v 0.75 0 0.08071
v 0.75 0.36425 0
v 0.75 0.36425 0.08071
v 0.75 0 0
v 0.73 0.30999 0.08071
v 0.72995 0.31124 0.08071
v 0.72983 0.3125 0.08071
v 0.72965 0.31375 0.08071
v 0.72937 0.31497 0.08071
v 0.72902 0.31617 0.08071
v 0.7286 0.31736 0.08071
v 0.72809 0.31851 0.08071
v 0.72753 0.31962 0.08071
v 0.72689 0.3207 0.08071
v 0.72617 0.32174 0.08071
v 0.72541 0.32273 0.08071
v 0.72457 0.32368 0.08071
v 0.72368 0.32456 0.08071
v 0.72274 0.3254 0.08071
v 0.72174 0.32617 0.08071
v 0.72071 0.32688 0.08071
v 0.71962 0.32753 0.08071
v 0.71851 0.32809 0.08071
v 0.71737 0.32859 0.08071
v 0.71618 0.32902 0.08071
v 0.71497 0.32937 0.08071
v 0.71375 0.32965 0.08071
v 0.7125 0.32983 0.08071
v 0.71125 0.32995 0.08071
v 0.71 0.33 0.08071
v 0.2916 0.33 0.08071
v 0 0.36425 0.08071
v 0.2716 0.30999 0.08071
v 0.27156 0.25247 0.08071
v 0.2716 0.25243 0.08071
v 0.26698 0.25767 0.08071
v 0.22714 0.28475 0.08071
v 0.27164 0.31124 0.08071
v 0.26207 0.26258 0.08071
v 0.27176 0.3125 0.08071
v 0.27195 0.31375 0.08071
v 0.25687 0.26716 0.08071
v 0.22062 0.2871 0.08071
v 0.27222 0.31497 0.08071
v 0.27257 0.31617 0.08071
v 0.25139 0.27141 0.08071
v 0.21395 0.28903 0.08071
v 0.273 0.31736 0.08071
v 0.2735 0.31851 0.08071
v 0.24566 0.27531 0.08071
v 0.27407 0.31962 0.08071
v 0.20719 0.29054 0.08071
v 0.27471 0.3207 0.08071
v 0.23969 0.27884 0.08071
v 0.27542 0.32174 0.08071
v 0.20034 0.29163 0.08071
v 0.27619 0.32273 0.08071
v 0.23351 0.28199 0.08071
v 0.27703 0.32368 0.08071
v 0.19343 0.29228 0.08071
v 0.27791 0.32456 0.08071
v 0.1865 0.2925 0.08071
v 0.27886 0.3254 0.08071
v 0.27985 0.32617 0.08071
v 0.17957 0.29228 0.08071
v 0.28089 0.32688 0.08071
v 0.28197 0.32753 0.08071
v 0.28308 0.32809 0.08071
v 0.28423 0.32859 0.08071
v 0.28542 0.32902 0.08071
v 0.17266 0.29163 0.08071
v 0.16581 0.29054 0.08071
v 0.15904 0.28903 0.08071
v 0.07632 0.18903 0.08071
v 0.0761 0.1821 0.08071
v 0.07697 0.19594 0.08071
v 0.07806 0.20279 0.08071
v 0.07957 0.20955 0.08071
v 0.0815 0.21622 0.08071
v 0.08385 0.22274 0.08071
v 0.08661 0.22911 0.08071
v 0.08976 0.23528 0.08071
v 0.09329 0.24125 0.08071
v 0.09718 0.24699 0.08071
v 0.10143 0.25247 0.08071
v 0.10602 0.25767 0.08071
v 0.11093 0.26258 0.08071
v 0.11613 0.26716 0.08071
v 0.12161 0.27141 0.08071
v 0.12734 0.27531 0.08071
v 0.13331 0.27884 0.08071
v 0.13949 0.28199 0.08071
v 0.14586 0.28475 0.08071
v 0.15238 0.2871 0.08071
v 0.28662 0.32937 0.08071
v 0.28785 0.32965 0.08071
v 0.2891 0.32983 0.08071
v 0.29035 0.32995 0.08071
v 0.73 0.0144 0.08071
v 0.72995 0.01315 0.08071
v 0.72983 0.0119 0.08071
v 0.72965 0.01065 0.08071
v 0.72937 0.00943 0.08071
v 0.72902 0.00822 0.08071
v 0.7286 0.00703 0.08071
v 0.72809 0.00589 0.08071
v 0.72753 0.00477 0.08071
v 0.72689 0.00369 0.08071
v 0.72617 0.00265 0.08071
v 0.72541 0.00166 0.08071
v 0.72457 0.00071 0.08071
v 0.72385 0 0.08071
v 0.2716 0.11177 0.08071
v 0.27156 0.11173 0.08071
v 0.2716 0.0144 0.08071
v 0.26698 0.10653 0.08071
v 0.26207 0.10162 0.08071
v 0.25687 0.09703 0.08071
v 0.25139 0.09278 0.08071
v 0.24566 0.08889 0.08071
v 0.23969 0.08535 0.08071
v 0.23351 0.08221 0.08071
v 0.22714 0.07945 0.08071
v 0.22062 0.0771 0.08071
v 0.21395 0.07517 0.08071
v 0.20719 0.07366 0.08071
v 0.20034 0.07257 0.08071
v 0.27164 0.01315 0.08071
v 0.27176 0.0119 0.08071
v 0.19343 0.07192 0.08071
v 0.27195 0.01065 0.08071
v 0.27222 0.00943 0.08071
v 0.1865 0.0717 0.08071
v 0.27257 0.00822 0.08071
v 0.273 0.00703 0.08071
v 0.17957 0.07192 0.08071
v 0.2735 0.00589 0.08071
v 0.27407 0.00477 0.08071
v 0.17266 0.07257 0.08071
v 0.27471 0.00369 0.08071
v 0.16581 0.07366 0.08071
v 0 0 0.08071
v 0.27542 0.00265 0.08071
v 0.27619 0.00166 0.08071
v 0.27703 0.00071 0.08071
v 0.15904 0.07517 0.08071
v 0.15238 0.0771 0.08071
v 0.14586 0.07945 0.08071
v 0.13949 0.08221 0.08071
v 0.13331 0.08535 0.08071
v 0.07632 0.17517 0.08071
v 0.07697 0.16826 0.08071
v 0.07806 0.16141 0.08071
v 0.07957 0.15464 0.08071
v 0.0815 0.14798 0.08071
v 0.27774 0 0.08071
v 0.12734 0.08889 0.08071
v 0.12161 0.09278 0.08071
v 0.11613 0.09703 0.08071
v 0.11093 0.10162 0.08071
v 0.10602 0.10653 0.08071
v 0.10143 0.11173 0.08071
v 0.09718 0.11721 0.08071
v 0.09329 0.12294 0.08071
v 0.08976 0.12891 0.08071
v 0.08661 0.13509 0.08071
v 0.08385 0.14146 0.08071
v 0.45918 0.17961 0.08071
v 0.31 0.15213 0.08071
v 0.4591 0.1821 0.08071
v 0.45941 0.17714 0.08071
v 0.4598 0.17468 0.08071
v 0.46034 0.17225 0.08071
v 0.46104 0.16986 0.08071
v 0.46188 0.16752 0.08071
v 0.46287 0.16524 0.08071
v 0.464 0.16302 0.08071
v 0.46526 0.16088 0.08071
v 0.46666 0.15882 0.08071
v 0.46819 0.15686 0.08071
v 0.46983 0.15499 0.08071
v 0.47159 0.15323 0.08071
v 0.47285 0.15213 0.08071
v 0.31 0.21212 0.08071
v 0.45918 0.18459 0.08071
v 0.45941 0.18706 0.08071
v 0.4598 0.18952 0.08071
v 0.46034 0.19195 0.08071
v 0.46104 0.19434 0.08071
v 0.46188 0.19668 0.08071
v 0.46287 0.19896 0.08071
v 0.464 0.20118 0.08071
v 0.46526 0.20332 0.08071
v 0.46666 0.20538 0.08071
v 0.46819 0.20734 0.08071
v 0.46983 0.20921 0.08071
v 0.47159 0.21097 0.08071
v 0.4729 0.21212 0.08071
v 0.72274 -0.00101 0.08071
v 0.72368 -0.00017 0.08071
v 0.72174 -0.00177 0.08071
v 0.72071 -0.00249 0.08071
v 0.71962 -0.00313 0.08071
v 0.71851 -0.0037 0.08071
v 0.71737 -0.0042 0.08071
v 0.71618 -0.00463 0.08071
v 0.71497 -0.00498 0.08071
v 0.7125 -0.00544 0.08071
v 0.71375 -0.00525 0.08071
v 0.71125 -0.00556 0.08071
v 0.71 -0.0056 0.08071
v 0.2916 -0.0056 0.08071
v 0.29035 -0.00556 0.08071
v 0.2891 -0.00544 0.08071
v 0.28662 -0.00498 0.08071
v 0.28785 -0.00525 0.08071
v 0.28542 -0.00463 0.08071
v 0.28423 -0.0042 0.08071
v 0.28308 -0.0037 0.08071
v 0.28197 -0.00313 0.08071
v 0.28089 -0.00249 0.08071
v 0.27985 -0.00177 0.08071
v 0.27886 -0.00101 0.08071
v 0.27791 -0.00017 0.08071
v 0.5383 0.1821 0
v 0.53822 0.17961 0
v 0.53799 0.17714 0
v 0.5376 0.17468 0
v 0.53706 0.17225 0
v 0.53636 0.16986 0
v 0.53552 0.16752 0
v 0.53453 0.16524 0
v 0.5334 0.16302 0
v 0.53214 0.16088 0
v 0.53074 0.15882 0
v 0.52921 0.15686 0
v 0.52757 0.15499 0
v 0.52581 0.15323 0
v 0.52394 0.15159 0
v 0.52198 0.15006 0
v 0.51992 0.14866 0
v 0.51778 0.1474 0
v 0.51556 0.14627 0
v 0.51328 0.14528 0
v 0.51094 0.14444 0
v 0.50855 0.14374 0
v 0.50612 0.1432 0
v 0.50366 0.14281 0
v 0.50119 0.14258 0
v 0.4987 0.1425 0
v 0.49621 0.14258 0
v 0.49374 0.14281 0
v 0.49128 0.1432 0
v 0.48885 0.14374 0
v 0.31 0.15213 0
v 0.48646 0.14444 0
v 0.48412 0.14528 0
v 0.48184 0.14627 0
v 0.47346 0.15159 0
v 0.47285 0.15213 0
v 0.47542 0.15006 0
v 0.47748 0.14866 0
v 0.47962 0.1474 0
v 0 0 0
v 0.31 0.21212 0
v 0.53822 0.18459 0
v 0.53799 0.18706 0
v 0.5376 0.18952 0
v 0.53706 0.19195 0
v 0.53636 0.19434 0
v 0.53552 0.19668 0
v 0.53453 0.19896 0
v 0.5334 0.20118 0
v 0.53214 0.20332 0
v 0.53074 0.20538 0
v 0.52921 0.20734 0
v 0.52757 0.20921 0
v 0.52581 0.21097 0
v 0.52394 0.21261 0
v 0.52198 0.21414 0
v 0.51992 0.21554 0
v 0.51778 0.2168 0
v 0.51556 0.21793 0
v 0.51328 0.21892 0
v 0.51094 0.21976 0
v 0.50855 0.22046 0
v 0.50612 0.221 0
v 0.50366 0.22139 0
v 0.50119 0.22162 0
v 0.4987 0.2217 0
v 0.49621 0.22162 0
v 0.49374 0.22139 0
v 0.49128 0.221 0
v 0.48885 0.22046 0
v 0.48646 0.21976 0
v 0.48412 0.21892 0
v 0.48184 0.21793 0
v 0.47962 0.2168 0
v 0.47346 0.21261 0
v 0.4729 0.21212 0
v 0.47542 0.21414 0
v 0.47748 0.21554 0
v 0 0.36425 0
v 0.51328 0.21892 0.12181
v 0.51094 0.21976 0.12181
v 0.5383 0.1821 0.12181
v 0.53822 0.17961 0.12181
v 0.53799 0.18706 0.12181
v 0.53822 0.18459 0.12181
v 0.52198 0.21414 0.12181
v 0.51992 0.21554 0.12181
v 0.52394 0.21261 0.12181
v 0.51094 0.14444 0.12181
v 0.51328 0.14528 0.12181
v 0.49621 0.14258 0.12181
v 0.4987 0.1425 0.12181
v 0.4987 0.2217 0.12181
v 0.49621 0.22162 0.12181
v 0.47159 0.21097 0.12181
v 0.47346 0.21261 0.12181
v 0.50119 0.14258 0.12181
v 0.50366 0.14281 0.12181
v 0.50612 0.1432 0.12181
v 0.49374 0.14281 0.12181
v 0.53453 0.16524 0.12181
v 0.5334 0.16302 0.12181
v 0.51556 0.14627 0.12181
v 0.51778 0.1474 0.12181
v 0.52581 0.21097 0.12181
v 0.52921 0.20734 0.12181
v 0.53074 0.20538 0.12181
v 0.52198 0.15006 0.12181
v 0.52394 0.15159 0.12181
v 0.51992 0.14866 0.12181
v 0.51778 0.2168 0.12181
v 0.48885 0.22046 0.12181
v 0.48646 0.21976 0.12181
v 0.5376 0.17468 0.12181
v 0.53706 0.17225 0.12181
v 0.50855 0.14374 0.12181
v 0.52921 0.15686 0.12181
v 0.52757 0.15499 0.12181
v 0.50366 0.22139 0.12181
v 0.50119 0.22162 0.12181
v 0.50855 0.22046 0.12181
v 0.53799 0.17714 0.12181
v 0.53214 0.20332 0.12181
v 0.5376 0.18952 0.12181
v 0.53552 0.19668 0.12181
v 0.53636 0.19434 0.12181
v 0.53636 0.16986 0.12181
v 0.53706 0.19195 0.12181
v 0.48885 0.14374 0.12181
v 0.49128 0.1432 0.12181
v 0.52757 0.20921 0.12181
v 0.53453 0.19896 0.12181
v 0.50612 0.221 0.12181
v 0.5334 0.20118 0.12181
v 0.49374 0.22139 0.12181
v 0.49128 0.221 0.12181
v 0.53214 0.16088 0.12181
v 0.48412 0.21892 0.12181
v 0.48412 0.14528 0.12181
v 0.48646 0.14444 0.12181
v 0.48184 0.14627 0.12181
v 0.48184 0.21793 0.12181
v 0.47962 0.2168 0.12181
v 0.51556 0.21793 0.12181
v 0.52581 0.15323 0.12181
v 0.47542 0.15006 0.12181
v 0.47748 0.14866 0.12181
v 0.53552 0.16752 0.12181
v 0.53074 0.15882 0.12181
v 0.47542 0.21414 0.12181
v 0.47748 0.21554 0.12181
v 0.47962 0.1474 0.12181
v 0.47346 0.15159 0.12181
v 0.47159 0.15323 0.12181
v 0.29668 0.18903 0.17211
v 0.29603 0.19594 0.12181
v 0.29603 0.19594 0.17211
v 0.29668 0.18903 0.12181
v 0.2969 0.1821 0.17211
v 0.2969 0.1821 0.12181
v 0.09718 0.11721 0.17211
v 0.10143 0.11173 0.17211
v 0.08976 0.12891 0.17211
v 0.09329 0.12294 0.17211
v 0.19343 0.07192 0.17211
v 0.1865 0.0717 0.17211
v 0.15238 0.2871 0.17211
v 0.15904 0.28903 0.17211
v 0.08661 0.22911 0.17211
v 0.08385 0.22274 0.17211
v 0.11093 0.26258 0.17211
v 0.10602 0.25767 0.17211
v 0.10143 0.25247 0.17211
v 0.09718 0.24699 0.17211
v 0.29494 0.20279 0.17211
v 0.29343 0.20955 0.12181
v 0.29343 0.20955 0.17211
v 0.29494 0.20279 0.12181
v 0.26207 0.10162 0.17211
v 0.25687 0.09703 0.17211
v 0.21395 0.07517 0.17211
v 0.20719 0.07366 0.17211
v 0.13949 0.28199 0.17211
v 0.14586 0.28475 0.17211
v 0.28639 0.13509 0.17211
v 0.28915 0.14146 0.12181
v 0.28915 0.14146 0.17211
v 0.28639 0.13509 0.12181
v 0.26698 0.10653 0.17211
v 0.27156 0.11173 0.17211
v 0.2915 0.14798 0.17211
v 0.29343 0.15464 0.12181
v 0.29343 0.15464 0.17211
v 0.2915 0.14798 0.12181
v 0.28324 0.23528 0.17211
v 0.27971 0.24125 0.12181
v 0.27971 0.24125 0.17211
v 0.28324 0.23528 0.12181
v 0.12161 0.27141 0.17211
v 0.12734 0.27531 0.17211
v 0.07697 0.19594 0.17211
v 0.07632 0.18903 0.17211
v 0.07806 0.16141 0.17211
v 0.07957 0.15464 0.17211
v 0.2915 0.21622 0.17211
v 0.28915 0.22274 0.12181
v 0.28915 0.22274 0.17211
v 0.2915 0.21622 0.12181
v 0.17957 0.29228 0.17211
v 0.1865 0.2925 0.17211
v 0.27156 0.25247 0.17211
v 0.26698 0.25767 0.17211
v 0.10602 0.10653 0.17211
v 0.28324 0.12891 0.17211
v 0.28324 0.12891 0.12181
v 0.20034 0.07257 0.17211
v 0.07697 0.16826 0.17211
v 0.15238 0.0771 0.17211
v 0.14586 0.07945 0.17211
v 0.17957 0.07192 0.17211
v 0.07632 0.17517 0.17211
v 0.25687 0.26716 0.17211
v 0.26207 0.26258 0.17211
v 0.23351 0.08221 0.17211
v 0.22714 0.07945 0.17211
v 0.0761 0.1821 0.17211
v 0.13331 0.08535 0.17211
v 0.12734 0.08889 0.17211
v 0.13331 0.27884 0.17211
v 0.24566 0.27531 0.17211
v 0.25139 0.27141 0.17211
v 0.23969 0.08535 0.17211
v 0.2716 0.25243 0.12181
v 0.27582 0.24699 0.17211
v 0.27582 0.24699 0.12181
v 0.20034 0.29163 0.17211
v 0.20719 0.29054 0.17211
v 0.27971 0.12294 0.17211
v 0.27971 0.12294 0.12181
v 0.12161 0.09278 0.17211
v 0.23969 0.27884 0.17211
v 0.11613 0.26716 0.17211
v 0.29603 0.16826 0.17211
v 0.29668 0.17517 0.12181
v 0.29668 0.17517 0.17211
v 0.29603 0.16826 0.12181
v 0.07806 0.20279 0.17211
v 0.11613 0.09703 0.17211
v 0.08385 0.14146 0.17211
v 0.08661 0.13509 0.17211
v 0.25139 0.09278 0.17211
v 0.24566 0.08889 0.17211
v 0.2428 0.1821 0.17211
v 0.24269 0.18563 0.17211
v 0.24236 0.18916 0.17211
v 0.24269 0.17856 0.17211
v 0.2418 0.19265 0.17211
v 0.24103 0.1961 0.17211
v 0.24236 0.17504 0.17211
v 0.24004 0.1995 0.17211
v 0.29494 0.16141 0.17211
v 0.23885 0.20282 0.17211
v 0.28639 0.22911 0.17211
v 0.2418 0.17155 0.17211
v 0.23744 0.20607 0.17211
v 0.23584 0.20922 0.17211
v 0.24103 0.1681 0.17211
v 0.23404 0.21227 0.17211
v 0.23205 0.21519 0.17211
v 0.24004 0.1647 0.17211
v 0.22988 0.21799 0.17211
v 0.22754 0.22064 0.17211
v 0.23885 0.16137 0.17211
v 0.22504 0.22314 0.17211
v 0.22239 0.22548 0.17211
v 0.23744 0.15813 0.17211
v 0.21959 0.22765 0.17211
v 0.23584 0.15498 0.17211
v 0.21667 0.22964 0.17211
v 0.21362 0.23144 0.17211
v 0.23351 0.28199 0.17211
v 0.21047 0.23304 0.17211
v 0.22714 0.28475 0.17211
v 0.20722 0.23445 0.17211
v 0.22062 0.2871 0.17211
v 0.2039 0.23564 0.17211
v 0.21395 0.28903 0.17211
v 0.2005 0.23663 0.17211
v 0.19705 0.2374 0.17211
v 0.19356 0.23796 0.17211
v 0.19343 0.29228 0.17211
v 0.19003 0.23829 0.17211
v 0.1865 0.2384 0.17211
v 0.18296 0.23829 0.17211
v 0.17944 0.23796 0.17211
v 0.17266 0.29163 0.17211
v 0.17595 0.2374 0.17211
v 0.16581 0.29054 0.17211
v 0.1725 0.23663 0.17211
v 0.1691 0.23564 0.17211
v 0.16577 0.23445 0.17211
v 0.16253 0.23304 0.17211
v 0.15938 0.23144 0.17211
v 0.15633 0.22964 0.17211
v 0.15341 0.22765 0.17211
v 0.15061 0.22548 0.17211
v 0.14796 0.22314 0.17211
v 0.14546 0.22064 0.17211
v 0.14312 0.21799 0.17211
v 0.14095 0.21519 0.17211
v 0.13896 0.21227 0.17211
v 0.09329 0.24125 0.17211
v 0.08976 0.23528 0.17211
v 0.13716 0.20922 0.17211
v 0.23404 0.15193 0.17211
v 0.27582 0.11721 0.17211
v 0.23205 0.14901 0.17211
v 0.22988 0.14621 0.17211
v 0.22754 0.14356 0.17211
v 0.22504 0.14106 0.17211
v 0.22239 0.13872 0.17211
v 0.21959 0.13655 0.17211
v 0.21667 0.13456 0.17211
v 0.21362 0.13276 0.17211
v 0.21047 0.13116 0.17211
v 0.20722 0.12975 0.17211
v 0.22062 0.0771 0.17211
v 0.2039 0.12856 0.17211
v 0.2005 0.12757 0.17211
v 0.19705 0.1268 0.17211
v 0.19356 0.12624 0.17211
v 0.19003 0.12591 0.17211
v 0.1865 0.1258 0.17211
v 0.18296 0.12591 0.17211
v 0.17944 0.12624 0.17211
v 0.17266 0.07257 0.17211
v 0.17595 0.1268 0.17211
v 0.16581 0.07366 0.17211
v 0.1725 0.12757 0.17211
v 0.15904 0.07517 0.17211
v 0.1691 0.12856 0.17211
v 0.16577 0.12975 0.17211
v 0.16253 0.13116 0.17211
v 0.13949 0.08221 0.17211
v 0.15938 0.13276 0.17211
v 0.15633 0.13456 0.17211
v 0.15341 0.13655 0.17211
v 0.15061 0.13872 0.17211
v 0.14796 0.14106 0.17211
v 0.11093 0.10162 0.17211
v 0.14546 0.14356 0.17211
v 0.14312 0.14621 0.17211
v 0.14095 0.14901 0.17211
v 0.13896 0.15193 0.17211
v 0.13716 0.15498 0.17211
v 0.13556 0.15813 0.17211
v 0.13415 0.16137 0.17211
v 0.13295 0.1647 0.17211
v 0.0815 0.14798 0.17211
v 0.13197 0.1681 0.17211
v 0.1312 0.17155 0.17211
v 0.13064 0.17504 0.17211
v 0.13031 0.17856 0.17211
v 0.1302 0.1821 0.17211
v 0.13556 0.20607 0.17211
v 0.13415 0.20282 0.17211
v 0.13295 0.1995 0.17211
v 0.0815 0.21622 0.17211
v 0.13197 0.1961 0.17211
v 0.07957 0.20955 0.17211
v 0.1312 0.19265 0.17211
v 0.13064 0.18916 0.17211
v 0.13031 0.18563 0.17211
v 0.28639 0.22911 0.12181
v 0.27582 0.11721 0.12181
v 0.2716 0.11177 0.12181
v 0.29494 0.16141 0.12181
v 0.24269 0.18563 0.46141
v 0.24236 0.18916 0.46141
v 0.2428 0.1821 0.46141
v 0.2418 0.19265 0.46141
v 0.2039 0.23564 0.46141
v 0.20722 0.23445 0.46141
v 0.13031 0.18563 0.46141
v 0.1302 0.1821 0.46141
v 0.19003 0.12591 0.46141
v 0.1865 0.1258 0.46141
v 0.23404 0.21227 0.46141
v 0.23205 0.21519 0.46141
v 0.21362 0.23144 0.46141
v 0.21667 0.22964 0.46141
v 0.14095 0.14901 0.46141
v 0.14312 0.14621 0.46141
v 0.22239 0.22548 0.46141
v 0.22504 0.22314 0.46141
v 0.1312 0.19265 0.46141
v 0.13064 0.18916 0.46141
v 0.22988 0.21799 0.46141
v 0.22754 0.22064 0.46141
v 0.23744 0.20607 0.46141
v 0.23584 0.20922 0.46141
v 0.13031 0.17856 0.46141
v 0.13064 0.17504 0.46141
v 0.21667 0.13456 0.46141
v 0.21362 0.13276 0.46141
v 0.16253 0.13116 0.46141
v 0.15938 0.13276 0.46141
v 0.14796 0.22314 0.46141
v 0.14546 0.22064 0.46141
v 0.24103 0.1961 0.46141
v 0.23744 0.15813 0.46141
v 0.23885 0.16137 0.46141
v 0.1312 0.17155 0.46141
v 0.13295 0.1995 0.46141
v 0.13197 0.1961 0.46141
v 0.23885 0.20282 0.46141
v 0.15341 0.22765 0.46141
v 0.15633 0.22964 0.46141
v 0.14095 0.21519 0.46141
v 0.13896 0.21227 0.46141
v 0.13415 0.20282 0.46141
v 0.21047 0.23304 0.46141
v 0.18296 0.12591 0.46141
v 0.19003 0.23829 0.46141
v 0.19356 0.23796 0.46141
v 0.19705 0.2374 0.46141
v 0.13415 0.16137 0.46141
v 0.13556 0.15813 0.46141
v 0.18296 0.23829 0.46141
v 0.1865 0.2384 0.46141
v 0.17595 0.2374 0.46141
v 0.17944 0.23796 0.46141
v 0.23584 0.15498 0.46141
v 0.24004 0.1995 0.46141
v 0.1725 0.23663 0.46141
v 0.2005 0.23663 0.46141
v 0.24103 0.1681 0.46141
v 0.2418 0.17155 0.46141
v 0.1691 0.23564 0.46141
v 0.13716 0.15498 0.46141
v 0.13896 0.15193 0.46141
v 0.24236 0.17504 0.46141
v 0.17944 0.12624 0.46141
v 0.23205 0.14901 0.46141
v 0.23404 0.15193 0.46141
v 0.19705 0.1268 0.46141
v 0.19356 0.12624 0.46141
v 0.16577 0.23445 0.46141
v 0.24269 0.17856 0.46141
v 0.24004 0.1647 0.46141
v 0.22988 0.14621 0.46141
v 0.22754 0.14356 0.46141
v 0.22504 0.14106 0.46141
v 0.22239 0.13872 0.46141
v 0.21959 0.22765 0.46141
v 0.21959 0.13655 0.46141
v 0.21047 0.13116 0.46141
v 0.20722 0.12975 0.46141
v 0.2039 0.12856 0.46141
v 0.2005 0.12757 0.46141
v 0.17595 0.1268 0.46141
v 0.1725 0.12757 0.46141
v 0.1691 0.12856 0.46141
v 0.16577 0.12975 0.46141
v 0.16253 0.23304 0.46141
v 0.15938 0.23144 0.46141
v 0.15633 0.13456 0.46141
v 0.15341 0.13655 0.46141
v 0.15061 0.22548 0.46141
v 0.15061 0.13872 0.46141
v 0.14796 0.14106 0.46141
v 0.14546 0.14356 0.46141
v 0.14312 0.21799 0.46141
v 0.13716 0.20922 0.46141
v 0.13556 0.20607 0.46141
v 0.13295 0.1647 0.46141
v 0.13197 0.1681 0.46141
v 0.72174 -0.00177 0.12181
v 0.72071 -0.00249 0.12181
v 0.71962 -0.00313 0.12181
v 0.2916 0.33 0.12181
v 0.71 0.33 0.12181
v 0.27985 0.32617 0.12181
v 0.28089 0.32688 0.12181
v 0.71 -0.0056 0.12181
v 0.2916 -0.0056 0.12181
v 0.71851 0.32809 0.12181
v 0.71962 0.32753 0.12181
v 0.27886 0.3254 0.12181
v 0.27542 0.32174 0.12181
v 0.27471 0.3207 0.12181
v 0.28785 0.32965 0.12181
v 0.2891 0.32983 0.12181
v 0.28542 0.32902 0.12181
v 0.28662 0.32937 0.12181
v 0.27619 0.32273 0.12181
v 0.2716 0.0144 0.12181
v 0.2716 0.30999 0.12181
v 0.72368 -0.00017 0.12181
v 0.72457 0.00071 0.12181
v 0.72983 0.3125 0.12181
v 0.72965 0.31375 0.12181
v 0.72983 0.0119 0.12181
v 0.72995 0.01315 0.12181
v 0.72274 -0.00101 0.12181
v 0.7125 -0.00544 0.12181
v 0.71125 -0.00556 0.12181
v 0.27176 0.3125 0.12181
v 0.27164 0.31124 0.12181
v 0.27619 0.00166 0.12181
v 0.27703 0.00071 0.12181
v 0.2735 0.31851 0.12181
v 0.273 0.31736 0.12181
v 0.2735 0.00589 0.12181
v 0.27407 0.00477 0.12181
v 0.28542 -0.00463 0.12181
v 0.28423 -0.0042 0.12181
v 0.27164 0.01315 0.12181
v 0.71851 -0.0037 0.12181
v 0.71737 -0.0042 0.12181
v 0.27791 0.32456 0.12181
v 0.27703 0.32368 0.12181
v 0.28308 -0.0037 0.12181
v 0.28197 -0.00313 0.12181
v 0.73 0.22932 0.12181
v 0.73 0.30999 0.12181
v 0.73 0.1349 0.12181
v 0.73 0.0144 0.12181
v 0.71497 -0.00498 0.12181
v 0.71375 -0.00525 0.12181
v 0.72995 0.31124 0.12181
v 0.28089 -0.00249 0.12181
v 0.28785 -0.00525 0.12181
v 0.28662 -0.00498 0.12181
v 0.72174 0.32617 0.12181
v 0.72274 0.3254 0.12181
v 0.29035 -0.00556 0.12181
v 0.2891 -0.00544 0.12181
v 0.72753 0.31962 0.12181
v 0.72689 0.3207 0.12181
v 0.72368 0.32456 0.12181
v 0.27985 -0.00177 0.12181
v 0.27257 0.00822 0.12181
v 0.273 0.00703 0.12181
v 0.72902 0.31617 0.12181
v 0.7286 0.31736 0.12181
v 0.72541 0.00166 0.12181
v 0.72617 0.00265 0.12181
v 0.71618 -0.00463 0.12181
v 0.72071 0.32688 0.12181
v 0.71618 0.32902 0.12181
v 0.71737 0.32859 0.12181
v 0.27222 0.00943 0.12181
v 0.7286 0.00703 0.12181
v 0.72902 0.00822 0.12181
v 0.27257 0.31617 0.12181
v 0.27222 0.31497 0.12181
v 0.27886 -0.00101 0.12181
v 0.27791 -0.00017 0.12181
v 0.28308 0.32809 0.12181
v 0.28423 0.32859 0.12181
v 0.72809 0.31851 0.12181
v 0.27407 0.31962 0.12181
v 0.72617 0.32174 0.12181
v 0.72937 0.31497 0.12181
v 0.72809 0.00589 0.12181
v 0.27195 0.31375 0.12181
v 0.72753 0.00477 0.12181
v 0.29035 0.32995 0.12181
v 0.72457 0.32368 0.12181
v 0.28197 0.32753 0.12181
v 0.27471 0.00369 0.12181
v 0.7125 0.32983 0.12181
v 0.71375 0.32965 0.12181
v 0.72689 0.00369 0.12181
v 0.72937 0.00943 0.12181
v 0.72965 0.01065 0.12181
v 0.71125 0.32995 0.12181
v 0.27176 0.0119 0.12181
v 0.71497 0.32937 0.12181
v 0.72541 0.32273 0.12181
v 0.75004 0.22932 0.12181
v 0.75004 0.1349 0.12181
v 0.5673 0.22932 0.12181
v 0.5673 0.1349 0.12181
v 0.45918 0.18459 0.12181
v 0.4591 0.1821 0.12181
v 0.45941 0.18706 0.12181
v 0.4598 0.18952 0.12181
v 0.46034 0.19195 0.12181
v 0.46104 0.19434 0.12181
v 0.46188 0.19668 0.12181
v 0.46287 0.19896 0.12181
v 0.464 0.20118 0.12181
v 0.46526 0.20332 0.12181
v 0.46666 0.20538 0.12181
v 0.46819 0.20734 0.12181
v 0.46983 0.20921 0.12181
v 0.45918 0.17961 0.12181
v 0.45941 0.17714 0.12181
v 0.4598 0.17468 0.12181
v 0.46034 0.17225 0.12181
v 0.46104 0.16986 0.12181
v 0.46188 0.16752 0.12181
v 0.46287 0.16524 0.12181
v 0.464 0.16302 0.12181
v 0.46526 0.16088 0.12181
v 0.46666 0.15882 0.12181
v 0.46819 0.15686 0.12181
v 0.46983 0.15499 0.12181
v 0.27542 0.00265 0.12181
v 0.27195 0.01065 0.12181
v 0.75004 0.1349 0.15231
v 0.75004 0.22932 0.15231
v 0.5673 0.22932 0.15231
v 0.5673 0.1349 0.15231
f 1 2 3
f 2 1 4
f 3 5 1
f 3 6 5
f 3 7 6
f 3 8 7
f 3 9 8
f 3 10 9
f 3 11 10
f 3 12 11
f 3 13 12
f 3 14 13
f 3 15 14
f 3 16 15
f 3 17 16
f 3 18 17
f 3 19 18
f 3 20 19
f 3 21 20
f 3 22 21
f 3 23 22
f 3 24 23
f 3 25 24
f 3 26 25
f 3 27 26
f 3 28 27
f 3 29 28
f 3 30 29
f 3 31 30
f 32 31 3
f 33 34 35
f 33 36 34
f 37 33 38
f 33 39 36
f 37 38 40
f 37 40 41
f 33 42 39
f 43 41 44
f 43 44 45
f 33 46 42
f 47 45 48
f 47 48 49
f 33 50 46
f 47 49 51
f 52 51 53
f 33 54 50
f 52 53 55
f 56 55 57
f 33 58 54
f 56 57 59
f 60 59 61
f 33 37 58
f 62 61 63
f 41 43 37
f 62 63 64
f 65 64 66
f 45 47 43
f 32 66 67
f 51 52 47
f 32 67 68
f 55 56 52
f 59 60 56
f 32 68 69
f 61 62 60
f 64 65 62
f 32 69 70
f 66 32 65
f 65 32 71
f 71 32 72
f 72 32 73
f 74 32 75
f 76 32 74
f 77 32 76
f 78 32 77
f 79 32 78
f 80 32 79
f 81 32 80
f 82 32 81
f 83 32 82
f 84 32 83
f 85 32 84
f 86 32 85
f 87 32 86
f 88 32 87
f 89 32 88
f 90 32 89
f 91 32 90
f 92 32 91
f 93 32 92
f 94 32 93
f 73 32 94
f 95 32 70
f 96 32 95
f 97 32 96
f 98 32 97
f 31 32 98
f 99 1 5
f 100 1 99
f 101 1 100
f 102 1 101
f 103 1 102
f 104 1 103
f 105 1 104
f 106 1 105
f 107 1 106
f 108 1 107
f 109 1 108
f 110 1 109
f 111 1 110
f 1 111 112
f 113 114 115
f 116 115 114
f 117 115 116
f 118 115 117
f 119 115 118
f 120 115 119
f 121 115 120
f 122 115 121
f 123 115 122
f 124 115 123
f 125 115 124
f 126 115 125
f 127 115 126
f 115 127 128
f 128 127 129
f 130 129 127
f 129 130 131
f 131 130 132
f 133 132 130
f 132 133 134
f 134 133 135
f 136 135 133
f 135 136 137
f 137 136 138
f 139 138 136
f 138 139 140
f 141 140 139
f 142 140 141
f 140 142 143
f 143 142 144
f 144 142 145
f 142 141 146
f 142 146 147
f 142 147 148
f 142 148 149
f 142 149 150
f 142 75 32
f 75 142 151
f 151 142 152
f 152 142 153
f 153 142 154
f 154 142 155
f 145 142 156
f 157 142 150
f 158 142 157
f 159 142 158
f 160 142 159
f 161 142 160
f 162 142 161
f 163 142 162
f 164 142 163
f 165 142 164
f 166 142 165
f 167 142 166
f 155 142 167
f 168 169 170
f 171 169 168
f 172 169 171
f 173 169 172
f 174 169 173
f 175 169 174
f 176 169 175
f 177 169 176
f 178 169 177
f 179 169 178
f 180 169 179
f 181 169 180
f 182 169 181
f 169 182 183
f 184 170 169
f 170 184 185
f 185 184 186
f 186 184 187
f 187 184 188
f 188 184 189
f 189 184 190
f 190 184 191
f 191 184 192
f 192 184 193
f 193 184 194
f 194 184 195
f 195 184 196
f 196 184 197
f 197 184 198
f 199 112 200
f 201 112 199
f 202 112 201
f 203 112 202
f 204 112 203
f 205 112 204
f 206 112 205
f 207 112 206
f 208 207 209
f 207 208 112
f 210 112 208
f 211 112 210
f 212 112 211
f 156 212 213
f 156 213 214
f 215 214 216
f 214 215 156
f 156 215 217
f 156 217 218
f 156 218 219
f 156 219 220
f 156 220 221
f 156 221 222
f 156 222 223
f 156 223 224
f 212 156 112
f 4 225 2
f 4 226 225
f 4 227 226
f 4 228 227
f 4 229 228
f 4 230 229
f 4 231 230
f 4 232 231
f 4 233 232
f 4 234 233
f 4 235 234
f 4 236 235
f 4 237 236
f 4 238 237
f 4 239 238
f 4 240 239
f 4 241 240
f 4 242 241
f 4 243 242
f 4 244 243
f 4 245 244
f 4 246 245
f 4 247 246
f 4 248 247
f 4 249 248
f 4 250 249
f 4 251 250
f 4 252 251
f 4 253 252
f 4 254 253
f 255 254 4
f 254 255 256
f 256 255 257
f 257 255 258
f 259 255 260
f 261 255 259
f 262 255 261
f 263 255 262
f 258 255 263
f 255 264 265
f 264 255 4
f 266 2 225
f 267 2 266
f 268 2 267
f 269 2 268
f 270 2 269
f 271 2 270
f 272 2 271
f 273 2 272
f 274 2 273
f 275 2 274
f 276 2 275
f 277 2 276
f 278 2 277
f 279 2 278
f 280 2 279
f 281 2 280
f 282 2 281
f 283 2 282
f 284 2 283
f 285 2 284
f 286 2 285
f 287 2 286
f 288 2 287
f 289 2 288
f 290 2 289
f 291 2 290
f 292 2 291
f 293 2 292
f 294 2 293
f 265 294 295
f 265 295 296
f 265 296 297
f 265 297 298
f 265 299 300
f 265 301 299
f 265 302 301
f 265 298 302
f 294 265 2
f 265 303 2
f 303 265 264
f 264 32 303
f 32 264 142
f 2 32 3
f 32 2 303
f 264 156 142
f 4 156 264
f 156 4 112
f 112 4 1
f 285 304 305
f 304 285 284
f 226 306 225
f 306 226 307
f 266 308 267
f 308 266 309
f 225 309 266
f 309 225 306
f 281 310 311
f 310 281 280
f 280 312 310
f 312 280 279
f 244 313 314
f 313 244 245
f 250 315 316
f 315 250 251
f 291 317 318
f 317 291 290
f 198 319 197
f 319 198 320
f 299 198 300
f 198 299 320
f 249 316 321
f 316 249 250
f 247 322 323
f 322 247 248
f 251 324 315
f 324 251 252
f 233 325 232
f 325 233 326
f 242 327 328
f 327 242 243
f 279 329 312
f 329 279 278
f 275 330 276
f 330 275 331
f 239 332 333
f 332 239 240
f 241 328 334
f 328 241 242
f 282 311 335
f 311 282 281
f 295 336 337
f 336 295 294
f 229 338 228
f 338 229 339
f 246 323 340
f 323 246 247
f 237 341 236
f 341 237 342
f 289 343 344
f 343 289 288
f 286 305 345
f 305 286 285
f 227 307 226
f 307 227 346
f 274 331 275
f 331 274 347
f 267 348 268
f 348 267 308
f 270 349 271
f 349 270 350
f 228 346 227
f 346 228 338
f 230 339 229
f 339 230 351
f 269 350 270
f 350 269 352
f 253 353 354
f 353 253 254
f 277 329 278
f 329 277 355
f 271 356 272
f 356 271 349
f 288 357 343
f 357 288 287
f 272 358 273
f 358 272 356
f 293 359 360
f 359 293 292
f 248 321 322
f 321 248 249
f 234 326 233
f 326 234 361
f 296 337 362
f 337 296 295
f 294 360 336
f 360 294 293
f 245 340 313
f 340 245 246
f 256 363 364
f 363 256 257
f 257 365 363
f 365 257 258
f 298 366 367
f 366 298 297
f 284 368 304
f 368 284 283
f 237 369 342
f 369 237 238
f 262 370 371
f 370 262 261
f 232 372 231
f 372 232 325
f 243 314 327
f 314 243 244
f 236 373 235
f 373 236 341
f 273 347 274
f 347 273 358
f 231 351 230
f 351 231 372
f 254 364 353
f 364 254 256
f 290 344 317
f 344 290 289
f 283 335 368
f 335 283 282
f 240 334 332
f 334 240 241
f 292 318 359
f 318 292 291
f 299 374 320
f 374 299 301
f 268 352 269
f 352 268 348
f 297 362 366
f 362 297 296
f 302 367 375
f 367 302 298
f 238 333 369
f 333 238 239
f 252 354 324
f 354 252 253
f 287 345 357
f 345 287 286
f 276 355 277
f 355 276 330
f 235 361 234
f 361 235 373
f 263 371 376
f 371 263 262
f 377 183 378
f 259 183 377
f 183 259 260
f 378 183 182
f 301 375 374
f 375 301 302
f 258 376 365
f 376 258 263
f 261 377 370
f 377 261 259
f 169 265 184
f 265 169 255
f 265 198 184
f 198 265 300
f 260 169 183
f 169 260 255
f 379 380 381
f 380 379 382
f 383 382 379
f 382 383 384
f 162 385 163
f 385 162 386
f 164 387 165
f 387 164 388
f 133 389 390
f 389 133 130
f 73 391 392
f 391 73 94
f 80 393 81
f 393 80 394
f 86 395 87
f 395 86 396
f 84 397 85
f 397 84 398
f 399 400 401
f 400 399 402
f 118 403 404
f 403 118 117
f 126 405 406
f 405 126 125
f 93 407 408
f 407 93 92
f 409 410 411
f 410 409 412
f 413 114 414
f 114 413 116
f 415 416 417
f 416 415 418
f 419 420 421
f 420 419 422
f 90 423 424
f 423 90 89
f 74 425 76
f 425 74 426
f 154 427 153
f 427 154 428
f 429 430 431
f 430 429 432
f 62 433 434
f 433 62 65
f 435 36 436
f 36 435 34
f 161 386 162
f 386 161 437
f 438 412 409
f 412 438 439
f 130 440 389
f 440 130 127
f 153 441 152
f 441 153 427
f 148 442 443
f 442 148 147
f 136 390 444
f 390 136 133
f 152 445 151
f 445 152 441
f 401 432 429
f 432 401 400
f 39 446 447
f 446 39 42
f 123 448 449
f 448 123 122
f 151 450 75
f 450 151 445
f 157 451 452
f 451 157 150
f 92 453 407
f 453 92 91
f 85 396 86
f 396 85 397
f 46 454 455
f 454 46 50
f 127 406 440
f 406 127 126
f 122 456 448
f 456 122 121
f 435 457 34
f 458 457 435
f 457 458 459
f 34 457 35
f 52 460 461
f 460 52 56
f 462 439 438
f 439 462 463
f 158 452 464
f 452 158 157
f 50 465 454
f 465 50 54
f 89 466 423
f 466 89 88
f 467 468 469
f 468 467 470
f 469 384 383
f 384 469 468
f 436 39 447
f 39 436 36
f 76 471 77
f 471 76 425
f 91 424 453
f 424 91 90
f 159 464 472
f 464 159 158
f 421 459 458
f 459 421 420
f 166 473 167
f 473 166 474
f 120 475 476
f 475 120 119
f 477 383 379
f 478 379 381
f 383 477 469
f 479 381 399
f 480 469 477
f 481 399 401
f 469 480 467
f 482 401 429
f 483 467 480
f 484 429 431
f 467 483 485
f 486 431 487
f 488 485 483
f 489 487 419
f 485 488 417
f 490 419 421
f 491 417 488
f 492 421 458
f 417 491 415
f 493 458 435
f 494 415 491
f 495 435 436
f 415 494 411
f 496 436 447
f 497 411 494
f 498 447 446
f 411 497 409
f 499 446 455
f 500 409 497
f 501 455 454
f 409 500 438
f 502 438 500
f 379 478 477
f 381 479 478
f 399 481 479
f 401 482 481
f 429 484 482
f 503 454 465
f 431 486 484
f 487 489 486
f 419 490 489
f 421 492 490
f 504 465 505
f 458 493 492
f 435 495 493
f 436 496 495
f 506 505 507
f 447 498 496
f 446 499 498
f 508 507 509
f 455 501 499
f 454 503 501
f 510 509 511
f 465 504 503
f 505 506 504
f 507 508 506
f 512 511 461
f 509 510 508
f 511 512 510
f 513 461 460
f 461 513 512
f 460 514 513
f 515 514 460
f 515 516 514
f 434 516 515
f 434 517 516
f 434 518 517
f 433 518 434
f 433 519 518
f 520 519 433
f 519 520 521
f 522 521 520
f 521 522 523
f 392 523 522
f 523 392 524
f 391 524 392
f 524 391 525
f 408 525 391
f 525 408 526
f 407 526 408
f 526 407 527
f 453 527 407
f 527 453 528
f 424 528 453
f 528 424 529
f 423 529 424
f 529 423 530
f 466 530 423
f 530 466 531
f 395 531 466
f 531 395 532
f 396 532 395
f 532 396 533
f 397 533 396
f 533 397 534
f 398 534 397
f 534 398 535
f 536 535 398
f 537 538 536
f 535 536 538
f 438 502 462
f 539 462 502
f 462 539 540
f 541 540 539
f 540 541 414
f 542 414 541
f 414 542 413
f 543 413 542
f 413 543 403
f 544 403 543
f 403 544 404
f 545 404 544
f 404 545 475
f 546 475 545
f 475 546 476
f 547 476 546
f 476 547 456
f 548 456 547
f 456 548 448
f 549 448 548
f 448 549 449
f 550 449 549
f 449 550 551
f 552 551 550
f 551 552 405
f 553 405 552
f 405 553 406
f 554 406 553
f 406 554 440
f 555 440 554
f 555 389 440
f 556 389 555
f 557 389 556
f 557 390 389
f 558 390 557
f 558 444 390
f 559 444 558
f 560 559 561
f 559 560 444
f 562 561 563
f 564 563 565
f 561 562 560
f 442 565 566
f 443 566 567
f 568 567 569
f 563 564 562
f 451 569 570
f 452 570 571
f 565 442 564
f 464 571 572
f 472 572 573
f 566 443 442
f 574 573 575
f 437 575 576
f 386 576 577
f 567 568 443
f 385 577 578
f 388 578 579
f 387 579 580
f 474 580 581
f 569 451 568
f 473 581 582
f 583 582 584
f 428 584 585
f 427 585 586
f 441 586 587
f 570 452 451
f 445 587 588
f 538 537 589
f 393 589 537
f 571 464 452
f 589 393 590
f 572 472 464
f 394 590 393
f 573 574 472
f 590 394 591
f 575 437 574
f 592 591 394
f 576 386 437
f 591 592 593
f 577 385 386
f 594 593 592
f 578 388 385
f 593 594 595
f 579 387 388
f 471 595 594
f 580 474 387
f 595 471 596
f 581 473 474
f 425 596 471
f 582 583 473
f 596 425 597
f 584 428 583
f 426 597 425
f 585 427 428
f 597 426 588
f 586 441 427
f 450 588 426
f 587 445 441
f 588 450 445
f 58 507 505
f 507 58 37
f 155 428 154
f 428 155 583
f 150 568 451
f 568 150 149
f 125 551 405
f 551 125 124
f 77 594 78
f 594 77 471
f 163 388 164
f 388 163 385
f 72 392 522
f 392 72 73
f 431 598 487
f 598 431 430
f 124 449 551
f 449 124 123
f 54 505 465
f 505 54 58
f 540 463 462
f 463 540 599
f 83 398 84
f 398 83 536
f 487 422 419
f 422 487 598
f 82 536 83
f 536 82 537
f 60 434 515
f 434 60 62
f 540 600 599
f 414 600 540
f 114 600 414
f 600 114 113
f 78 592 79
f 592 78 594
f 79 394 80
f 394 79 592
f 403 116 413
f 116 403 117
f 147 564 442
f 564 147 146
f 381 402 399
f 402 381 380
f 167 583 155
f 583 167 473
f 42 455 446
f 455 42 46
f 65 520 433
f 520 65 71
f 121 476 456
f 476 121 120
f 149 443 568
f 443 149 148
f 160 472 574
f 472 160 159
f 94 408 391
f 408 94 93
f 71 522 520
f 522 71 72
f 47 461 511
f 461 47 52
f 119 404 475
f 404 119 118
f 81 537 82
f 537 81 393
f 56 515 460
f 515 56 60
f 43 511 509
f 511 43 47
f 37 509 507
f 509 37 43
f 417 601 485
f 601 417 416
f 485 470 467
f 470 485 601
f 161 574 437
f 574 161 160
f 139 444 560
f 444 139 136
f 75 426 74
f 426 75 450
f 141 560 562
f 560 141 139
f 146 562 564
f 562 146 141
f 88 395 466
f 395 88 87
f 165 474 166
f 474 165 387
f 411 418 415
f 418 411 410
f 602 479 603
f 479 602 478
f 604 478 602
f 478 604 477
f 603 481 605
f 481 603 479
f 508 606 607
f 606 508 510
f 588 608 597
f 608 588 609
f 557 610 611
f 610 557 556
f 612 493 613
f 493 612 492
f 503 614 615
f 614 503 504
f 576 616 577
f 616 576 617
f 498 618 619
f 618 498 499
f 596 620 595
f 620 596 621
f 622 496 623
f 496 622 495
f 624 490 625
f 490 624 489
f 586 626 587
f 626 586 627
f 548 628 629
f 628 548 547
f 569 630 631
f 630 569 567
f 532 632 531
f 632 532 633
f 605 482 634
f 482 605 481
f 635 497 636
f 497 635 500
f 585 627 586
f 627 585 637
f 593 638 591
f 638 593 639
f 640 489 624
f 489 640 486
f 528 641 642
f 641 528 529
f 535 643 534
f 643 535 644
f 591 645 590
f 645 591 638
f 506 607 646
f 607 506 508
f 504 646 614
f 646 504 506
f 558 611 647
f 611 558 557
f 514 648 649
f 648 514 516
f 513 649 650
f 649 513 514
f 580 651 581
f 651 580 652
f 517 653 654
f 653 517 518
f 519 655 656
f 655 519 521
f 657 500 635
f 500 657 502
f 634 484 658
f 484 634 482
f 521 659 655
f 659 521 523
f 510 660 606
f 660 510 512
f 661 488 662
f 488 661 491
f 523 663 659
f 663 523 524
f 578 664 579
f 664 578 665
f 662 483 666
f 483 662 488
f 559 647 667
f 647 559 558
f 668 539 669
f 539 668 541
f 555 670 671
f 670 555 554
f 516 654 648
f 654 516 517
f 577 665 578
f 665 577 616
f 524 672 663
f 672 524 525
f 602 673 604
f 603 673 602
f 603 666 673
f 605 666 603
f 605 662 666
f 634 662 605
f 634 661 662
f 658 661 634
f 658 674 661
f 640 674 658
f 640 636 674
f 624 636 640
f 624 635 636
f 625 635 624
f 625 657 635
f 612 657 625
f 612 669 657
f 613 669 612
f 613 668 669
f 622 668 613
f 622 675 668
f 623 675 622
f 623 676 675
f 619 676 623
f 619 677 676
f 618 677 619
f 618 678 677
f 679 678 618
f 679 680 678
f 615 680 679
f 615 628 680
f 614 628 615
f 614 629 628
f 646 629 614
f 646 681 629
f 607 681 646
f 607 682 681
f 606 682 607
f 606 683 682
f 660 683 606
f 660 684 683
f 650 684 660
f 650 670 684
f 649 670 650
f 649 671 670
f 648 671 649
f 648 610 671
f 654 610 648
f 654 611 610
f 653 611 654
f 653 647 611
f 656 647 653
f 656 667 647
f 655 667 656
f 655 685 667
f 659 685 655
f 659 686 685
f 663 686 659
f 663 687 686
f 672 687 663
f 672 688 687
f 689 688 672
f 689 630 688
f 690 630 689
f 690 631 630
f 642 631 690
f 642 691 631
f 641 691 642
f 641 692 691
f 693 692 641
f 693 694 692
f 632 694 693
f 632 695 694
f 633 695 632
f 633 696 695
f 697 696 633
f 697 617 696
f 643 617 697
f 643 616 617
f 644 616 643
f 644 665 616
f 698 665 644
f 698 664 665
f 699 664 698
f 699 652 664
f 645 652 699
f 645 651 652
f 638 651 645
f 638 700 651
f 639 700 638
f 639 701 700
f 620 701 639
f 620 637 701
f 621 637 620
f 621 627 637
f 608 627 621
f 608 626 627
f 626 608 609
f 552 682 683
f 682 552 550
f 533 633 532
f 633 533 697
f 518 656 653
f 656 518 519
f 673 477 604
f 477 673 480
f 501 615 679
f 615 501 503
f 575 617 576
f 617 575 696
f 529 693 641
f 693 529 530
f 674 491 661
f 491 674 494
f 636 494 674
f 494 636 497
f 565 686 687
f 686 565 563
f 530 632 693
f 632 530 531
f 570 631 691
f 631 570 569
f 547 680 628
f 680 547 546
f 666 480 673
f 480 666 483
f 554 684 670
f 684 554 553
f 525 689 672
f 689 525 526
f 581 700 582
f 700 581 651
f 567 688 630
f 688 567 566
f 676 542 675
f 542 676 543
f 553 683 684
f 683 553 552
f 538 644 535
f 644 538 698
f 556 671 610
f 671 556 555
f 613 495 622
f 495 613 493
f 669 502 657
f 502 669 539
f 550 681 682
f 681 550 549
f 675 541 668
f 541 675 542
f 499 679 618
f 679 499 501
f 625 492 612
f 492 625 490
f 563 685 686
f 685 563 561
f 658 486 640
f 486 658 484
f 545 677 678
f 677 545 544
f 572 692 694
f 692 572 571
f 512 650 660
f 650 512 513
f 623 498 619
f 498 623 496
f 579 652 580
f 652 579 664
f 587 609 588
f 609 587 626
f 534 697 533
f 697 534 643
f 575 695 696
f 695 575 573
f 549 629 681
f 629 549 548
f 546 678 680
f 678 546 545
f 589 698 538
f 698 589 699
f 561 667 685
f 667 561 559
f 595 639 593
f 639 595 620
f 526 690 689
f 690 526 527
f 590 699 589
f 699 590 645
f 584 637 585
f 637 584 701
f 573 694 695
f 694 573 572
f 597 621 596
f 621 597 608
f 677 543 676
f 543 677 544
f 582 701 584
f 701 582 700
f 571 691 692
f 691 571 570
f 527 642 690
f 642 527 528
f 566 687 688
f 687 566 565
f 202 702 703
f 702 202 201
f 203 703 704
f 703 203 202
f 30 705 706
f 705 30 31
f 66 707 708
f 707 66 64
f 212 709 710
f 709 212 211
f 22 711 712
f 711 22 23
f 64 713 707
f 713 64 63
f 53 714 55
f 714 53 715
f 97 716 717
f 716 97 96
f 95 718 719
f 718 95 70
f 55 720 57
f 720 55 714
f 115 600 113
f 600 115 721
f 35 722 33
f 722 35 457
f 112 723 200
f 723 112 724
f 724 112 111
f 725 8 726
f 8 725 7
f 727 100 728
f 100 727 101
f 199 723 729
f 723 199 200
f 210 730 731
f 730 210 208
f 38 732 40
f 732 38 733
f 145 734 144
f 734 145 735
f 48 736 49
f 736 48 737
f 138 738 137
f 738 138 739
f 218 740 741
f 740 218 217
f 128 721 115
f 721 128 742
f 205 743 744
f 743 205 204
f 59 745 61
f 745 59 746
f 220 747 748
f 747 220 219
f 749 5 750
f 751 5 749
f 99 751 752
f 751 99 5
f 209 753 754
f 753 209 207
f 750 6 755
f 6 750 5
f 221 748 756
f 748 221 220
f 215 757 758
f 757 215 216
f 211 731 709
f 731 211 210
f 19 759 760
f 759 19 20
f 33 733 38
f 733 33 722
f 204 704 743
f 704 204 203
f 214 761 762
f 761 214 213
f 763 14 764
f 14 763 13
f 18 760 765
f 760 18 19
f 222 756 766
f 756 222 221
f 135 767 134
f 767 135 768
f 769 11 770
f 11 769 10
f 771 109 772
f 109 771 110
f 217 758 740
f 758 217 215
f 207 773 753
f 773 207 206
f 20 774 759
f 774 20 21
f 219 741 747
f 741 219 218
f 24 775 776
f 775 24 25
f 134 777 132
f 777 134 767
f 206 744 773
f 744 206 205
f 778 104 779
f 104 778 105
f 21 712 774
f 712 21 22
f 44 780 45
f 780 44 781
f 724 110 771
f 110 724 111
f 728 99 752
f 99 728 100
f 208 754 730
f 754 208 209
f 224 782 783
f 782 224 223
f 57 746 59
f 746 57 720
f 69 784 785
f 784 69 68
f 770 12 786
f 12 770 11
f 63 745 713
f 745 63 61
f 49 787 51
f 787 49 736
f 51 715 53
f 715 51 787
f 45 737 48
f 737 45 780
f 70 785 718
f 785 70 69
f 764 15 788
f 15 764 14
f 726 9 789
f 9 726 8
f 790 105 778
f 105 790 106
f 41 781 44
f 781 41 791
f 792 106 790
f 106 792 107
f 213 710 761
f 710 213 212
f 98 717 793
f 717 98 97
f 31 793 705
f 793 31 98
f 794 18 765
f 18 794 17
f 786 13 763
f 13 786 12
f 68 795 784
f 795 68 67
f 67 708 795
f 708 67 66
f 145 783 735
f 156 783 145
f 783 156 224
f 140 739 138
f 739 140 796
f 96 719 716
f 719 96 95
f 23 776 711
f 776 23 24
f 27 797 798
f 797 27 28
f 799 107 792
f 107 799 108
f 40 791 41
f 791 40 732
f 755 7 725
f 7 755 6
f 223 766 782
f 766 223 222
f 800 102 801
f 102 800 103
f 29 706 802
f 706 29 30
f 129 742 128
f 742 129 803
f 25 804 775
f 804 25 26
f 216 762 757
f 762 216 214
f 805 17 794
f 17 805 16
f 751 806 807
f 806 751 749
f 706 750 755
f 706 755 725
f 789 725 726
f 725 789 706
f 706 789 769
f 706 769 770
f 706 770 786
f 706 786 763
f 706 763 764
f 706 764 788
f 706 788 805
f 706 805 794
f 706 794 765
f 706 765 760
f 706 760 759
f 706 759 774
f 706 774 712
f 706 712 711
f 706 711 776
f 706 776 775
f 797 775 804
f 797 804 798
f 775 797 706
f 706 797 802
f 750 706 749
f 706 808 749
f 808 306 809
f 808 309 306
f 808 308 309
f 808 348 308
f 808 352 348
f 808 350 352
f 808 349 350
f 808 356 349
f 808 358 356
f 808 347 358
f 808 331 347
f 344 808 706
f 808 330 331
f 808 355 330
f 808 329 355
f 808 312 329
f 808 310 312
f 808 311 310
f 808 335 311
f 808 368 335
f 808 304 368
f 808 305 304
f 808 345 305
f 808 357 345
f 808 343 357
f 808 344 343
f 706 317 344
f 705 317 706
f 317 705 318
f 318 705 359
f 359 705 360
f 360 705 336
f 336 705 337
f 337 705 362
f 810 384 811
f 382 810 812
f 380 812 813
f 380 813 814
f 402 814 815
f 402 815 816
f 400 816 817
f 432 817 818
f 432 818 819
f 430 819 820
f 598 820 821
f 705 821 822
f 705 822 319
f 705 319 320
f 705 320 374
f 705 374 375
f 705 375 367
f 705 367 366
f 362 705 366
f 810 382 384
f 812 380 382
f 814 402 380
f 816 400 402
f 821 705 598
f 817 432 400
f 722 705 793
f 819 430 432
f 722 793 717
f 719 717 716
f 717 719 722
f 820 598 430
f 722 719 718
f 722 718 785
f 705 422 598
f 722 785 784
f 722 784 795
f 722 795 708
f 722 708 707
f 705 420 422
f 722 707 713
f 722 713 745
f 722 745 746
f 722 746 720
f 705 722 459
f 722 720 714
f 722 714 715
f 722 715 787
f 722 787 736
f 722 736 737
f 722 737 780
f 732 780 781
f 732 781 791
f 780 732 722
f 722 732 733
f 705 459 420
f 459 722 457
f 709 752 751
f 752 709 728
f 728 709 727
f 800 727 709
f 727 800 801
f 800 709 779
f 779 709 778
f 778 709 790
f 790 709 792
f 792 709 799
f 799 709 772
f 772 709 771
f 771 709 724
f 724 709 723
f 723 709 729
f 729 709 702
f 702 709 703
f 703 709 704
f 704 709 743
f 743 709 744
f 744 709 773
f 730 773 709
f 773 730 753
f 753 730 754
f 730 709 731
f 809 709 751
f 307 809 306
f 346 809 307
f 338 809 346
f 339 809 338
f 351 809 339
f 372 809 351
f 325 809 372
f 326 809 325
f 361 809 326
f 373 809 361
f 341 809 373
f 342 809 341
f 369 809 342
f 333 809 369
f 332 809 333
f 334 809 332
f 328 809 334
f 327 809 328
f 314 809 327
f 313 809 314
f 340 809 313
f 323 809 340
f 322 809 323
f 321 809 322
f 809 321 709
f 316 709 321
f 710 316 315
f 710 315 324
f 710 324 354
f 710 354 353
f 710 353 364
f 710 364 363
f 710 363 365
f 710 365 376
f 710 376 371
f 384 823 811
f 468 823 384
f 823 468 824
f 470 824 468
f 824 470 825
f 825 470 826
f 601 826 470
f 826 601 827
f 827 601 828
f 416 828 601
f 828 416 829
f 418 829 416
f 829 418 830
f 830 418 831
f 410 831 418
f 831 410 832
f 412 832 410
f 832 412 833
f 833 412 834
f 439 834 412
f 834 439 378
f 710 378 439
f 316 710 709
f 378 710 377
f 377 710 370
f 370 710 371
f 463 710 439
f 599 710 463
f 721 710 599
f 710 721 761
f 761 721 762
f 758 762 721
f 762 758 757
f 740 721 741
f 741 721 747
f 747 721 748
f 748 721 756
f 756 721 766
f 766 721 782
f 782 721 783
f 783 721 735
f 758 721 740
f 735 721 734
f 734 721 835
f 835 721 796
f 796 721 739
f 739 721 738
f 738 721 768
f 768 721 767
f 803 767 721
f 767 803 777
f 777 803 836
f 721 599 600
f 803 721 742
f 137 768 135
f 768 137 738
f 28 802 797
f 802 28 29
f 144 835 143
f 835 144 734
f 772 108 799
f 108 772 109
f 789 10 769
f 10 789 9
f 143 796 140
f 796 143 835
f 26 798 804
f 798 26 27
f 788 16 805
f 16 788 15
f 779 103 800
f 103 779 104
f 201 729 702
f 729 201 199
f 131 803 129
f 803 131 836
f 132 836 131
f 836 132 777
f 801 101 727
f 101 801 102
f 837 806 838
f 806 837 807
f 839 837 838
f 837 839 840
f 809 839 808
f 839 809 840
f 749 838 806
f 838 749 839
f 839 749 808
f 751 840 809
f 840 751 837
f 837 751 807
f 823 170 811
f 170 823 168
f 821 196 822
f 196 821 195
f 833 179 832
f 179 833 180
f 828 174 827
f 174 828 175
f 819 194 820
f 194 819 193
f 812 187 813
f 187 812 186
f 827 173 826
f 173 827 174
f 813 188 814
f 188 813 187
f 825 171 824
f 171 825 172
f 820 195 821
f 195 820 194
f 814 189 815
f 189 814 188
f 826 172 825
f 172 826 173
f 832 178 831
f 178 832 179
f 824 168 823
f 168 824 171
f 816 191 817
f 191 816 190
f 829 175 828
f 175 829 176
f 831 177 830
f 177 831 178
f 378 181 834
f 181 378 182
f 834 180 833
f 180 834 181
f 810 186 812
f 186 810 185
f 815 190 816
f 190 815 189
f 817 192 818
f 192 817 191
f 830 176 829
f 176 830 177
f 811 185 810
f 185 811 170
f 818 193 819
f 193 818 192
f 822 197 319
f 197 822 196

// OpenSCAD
$fn = 100;

// Main base plate
base_l = 0.75;
base_w = 0.364251;
base_h = 0.080711;

// Base circular through opening
hole_x = 0.4987;
hole_y = 0.1821;
hole_r = 0.0396;

// Inner slot-like through void in base
slot_l = 0.18;
slot_w = 0.06;
slot_x = 0.4;
slot_y = base_w / 2;

// Coaxial collar and post
collar_x = 0.1865;
collar_y = 0.1821;
collar_r = 0.1104;
collar_h = 0.0914;
post_r = 0.0563;
post_h = 0.2893;

// Raised rounded right-side region
raised_x = 0.2916;
raised_y = 0.0144;
raised_l = 0.4584;
raised_w = 0.3356;
raised_h = 0.0411;
raised_corner_r = 0.02;

// Rectangular rib on raised region shoulder
rib_x = 0.5673;
rib_y = 0.1349;
rib_l = 0.182741;
rib_w = 0.094416;
rib_h = 0.0305;

module rounded_rect(w, h, r) {
    offset(r = r) square([w - 2*r, h - 2*r]);
}

module base_body() {
    difference() {
        cube([base_l, base_w, base_h]);
        // Base circular through opening
        translate([hole_x, hole_y, -1])
            cylinder(h = base_h + 2, r = hole_r);
        // Inner slot-like opening
        translate([slot_x - slot_l/2, slot_y - slot_w/2, -1])
            cube([slot_l, slot_w, base_h + 2]);
    }
}

module raised_region() {
    translate([raised_x, raised_y, base_h])
        linear_extrude(height = raised_h)
            rounded_rect(raised_l, raised_w, raised_corner_r);
}

module rib() {
    translate([rib_x, rib_y, base_h + raised_h])
        cube([rib_l, rib_w, rib_h]);
}

module coaxial_stack() {
    translate([collar_x, collar_y, base_h])
        cylinder(h = collar_h, r = collar_r);
    translate([collar_x, collar_y, base_h + collar_h])
        cylinder(h = post_h, r = post_r);
}

difference() {
    union() {
        base_body();
        raised_region();
        rib();
        coaxial_stack();
    }
    // Continue hole through raised region and rib
    translate([hole_x, hole_y, base_h - 1])
        cylinder(h = raised_h + rib_h + 2, r = hole_r);
}
